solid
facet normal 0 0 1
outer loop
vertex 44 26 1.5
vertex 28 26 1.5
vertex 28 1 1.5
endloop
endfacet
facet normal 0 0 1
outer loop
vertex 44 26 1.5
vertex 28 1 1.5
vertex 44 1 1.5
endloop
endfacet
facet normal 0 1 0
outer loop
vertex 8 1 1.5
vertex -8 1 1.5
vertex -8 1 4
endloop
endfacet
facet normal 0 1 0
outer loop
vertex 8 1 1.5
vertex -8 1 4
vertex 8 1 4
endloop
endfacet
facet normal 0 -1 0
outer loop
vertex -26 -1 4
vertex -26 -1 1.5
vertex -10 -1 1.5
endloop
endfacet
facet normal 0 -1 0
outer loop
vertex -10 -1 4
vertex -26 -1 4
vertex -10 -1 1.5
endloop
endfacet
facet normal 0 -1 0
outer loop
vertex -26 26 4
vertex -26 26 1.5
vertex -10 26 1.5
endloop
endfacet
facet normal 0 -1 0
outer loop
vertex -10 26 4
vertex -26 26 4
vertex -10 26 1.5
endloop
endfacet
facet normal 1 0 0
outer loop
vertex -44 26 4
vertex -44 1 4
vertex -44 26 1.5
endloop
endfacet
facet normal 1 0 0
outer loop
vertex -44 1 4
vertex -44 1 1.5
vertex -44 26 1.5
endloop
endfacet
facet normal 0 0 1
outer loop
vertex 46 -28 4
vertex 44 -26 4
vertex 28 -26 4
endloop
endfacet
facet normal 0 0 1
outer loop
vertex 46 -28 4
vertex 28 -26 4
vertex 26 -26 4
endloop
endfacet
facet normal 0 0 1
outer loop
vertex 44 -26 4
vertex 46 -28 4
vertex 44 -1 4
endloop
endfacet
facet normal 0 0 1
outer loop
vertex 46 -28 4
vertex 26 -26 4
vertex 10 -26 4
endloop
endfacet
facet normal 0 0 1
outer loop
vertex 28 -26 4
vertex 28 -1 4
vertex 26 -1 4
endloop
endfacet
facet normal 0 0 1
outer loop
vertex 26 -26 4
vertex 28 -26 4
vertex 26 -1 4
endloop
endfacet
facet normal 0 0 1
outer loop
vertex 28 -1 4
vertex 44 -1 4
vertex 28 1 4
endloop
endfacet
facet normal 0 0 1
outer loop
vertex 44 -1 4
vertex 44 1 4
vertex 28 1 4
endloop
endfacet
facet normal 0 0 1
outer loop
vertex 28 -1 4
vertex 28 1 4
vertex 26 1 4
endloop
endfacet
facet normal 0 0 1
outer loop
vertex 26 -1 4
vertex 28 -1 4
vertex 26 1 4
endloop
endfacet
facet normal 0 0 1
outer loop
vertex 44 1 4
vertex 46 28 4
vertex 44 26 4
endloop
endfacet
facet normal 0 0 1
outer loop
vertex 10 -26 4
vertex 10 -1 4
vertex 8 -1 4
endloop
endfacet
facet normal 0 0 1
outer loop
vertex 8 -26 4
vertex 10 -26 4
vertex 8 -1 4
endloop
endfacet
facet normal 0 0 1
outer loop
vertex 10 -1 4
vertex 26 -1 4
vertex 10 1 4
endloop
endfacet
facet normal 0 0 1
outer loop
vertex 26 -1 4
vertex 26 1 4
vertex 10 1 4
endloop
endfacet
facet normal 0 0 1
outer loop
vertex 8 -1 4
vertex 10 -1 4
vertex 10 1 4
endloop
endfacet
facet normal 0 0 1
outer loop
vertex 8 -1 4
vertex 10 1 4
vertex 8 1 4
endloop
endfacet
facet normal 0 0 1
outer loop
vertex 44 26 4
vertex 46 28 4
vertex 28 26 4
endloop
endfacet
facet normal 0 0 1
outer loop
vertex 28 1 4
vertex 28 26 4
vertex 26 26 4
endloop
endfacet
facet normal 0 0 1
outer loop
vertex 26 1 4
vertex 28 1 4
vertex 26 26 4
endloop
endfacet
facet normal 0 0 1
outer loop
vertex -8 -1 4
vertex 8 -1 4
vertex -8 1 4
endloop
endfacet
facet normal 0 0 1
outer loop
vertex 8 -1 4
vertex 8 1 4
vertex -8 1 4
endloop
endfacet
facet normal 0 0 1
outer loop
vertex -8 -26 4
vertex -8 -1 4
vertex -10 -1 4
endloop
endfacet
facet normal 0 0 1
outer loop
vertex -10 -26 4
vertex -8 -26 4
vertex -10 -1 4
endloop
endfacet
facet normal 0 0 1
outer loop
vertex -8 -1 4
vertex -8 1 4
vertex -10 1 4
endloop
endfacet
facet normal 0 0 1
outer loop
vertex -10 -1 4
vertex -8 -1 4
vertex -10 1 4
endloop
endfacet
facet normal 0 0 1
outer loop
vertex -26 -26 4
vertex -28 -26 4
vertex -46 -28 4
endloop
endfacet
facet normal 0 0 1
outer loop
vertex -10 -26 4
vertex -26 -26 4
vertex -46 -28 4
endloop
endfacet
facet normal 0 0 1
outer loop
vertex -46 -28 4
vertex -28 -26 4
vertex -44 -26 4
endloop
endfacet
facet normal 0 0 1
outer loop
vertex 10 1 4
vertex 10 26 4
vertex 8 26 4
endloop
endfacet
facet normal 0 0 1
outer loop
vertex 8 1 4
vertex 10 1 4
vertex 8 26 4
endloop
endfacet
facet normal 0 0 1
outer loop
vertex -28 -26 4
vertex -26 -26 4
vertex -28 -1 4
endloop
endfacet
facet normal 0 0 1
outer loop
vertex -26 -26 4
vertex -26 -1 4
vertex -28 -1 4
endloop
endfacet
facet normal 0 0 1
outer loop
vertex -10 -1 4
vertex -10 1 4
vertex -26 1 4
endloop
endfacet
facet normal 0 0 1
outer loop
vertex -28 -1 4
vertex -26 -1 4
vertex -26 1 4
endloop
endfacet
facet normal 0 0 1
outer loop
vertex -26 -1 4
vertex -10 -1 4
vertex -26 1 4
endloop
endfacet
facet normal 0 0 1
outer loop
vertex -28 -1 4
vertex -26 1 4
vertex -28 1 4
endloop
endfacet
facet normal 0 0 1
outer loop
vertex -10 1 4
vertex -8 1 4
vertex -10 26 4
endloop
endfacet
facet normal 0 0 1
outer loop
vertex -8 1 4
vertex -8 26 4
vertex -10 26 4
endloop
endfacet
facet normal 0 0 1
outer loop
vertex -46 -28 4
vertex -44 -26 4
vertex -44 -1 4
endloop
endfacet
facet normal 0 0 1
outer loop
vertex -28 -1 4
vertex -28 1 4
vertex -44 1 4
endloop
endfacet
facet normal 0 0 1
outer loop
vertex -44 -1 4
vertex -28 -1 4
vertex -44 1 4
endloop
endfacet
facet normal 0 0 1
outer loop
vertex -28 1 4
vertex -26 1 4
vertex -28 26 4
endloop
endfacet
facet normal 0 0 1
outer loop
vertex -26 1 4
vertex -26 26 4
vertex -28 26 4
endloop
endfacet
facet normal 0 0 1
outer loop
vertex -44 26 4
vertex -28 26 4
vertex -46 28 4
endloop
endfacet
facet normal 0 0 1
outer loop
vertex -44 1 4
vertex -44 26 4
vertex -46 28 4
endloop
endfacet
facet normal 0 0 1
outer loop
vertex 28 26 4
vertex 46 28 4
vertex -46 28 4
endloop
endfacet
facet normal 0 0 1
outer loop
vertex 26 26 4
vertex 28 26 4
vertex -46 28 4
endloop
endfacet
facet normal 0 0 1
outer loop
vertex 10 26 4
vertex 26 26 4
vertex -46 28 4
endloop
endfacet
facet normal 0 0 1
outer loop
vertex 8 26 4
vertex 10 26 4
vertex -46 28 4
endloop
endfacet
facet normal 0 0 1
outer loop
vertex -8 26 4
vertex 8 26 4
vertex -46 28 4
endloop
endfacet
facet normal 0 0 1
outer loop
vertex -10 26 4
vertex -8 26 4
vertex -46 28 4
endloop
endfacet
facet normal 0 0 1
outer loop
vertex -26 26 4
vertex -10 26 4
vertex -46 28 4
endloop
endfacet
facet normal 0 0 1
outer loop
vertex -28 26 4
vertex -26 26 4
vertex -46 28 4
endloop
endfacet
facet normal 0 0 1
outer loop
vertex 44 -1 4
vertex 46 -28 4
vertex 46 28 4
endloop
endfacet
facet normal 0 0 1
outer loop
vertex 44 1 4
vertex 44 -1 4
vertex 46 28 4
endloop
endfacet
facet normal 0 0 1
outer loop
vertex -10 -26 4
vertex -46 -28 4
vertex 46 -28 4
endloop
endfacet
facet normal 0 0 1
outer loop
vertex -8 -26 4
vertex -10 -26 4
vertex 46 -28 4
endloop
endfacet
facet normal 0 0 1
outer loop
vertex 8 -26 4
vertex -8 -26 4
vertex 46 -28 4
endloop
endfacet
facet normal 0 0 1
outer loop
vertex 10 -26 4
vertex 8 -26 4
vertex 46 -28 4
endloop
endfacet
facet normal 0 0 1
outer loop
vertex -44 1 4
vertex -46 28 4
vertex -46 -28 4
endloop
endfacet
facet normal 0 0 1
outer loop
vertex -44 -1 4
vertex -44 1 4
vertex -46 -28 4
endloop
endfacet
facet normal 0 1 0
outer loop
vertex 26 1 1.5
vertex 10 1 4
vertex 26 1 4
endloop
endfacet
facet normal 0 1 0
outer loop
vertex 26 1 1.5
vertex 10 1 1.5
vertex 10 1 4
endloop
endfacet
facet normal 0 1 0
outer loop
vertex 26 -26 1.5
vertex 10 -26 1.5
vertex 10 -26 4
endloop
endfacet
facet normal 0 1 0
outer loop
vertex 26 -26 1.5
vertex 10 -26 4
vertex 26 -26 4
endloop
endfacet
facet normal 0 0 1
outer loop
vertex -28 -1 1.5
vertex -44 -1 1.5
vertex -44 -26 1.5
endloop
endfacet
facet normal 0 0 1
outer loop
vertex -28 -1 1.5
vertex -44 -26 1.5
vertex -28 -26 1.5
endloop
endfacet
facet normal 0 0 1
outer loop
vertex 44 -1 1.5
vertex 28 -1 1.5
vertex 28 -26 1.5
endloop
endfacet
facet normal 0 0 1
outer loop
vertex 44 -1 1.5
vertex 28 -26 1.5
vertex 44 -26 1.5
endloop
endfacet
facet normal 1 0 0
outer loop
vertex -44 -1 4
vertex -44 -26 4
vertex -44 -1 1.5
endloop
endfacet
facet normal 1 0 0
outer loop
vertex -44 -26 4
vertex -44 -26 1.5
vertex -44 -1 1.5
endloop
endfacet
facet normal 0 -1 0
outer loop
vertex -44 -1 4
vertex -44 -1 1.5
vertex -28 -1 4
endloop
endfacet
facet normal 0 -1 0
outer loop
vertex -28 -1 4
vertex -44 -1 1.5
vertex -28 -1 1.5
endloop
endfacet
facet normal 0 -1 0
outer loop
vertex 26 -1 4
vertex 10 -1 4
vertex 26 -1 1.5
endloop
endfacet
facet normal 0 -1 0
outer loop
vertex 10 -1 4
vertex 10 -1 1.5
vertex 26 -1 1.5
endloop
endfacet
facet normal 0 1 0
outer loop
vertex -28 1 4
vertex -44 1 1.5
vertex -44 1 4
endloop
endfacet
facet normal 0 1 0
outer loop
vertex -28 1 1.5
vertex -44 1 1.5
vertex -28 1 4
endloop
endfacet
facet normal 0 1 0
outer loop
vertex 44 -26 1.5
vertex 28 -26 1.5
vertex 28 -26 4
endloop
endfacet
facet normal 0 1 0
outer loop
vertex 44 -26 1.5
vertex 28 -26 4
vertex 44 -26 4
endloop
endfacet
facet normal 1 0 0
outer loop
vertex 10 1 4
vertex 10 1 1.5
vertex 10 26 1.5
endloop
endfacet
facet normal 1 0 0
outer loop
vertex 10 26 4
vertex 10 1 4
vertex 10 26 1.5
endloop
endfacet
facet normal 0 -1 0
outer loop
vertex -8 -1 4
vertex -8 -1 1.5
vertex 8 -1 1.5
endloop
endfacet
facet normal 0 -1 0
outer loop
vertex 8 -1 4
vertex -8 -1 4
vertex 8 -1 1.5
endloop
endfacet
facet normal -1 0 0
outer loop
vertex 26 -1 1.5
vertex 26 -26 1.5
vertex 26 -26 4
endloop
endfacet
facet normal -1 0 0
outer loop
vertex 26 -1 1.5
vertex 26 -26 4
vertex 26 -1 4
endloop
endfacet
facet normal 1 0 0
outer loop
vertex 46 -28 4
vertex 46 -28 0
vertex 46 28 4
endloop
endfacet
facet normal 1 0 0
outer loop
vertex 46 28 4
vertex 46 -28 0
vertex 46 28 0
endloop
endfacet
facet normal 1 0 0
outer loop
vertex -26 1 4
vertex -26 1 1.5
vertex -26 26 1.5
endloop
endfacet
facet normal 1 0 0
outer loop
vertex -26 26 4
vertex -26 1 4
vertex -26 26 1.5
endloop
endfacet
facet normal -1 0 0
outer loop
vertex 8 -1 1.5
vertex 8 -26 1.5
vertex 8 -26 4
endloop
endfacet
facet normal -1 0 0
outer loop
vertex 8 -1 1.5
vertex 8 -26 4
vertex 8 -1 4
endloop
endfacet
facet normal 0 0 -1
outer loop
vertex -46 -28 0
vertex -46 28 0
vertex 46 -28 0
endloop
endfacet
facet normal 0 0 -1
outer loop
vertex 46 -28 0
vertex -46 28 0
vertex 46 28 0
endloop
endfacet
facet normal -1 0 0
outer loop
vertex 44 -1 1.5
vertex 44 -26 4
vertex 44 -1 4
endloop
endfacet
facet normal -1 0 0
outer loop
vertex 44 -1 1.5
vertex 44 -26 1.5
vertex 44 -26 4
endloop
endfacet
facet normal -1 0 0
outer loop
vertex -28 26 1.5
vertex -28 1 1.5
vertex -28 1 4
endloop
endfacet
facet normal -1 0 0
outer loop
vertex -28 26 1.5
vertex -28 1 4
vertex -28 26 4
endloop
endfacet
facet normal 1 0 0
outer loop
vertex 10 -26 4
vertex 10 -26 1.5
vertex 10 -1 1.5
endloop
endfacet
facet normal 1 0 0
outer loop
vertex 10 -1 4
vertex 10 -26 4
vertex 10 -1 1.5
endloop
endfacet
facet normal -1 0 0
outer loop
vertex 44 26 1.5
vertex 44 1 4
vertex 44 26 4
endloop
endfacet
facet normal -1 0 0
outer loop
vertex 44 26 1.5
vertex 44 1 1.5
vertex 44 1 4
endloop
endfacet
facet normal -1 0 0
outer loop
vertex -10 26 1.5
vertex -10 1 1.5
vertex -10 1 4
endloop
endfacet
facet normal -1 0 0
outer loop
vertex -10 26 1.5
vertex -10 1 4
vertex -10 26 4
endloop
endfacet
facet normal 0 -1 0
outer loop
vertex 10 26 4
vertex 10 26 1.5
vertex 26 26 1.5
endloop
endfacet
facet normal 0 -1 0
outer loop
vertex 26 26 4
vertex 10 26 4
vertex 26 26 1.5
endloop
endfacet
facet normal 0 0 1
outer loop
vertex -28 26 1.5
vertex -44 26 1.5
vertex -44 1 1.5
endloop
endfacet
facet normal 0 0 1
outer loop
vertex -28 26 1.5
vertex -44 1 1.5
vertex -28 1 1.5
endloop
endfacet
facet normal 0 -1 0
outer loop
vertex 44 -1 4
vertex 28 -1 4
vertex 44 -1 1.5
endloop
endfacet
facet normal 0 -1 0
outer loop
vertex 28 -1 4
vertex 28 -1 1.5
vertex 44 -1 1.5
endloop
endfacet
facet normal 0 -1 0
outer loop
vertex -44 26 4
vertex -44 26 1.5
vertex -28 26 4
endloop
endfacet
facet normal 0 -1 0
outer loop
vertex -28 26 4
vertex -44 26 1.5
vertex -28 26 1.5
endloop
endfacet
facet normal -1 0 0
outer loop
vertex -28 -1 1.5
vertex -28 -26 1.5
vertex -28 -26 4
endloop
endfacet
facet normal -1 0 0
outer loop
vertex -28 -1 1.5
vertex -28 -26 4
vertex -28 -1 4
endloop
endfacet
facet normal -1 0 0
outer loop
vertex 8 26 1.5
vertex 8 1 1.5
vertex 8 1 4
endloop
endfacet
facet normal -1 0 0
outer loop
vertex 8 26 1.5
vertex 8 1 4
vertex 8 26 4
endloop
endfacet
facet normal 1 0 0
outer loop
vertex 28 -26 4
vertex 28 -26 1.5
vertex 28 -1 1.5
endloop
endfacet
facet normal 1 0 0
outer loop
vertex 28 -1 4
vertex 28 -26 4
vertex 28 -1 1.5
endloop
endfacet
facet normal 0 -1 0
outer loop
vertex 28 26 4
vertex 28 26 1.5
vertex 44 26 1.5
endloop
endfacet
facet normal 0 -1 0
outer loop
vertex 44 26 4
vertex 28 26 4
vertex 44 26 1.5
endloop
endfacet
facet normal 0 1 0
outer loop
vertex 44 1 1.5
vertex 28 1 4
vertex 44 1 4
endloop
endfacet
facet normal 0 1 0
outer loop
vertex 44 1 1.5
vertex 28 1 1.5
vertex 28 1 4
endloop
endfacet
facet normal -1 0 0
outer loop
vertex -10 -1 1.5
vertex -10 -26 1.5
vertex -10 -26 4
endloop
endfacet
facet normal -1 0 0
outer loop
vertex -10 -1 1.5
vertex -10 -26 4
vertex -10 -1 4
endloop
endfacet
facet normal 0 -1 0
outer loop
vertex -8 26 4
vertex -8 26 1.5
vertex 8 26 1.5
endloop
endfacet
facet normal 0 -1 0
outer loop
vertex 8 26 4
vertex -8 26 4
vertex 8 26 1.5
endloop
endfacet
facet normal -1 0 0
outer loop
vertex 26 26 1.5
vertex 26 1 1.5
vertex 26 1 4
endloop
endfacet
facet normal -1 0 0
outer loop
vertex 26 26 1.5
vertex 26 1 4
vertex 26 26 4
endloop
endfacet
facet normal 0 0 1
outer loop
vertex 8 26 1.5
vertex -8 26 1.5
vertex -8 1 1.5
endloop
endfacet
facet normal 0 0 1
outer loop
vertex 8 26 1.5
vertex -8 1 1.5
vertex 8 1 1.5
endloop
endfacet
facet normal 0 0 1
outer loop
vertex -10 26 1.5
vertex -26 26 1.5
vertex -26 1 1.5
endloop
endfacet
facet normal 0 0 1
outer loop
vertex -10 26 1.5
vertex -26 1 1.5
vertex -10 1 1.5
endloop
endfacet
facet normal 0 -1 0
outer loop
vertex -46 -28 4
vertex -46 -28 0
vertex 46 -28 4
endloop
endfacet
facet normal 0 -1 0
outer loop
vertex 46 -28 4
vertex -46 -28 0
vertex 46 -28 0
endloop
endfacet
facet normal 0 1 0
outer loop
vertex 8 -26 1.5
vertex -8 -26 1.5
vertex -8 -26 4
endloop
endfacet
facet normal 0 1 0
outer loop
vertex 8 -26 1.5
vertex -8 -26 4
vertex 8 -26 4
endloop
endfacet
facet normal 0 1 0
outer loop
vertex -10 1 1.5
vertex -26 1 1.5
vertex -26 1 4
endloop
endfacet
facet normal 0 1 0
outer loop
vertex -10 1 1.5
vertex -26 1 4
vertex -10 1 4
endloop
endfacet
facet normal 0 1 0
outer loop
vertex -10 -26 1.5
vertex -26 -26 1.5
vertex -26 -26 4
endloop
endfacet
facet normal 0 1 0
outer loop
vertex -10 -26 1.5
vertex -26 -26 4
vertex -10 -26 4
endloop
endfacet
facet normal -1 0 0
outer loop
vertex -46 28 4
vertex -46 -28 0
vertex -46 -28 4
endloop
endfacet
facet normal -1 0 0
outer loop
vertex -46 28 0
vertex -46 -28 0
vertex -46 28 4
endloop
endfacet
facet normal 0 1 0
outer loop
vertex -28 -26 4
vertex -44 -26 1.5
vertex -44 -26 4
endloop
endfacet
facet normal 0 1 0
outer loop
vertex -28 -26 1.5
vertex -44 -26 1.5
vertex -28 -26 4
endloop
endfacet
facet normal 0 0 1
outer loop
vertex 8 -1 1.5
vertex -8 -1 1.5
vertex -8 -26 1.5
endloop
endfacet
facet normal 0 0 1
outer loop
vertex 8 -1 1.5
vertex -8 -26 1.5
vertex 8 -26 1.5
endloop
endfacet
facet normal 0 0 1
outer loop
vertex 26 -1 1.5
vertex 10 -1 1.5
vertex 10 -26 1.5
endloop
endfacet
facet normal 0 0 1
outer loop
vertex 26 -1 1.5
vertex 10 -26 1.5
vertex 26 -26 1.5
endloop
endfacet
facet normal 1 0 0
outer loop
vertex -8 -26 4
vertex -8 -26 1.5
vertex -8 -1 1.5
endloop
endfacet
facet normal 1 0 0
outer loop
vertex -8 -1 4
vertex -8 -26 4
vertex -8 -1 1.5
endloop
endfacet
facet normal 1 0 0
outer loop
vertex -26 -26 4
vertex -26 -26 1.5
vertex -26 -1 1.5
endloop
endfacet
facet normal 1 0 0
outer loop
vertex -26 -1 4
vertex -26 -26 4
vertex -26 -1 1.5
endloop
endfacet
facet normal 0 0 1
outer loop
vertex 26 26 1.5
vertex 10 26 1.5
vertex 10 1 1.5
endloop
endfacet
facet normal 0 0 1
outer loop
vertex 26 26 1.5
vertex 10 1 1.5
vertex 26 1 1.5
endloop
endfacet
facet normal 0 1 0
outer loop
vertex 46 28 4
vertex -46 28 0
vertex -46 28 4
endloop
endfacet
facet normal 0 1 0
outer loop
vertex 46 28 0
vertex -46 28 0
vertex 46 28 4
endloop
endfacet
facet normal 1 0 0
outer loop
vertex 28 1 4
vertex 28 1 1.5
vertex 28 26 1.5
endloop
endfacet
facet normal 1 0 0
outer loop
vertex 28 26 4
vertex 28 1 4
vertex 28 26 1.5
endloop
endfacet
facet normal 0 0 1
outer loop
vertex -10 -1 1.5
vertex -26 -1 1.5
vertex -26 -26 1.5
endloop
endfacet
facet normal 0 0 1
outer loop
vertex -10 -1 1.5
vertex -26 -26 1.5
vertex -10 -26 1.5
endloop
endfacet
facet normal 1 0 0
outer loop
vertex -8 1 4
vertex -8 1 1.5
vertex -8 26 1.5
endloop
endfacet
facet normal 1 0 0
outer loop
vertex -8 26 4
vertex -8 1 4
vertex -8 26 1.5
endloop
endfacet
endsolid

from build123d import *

# Parameters (mm, degrees)
F0_W      = 92
F0_H      = 56
F1_DEPTH  = 1.5
F2_W      = 2
F2_H      = 56
F3_DEPTH  = 4
F5_W      = 92
F5_H      = 2
F6_DEPTH  = 4
F8_W      = 2
F8_H      = 56
F9_DEPTH  = 4
F11_W     = 2
F11_H     = 56
F12_DEPTH = 4
F14_W     = 92
F14_H     = 2
F15_DEPTH = 4


# Not quite as in the source:
# - a feature names something its author has since deleted; it is built from what else it names


with BuildPart() as f1:
    # F0 (on Top) → F1 (new body)
    with BuildSketch(Plane.XY):
        Rectangle(F0_W, F0_H)
    extrude(amount=F1_DEPTH)

    # F4: F3 across plane


with BuildPart() as f3:
    # F2 (on Top) → F3 (new body)
    with BuildSketch(Plane.XY):
        with Locations((45, 0)):
            Rectangle(F2_W, F2_H)
    extrude(amount=F3_DEPTH)


with BuildPart() as f1_1:
    add(f1.part)
    add(f3.part.mirror(Plane.YZ))


    add(f3.part)  # F6 merges F3
    # F5 (on Top) → F6 (join)
    with BuildSketch(Plane.XY):
        with Locations((0, -27)):
            Rectangle(F5_W, F5_H)
    extrude(amount=F6_DEPTH)

    # F7: F1 across plane


with BuildPart() as f1_2:
    add(f1_1.part)
    add(f1_1.part.mirror(Plane.XZ))

    # F8 (on Top) → F9 (join)
    with BuildSketch(Plane.XY):
        with Locations((27, 0)):
            Rectangle(F8_W, F8_H)
    extrude(amount=F9_DEPTH)

    # F10: F1 across plane


with BuildPart() as f1_3:
    add(f1_2.part)
    add(f1_2.part.mirror(Plane.YZ))

    # F11 (on Top) → F12 (join)
    with BuildSketch(Plane.XY):
        with Locations((9, 0)):
            Rectangle(F11_W, F11_H)
    extrude(amount=F12_DEPTH)

    # F13: F1 across plane


with BuildPart() as f1_4:
    add(f1_3.part)
    add(f1_3.part.mirror(Plane.YZ))

    # F14 (on Top) → F15 (join)
    with BuildSketch(Plane.XY):
        Rectangle(F14_W, F14_H)
    extrude(amount=F15_DEPTH)


solid = f1_4.part
